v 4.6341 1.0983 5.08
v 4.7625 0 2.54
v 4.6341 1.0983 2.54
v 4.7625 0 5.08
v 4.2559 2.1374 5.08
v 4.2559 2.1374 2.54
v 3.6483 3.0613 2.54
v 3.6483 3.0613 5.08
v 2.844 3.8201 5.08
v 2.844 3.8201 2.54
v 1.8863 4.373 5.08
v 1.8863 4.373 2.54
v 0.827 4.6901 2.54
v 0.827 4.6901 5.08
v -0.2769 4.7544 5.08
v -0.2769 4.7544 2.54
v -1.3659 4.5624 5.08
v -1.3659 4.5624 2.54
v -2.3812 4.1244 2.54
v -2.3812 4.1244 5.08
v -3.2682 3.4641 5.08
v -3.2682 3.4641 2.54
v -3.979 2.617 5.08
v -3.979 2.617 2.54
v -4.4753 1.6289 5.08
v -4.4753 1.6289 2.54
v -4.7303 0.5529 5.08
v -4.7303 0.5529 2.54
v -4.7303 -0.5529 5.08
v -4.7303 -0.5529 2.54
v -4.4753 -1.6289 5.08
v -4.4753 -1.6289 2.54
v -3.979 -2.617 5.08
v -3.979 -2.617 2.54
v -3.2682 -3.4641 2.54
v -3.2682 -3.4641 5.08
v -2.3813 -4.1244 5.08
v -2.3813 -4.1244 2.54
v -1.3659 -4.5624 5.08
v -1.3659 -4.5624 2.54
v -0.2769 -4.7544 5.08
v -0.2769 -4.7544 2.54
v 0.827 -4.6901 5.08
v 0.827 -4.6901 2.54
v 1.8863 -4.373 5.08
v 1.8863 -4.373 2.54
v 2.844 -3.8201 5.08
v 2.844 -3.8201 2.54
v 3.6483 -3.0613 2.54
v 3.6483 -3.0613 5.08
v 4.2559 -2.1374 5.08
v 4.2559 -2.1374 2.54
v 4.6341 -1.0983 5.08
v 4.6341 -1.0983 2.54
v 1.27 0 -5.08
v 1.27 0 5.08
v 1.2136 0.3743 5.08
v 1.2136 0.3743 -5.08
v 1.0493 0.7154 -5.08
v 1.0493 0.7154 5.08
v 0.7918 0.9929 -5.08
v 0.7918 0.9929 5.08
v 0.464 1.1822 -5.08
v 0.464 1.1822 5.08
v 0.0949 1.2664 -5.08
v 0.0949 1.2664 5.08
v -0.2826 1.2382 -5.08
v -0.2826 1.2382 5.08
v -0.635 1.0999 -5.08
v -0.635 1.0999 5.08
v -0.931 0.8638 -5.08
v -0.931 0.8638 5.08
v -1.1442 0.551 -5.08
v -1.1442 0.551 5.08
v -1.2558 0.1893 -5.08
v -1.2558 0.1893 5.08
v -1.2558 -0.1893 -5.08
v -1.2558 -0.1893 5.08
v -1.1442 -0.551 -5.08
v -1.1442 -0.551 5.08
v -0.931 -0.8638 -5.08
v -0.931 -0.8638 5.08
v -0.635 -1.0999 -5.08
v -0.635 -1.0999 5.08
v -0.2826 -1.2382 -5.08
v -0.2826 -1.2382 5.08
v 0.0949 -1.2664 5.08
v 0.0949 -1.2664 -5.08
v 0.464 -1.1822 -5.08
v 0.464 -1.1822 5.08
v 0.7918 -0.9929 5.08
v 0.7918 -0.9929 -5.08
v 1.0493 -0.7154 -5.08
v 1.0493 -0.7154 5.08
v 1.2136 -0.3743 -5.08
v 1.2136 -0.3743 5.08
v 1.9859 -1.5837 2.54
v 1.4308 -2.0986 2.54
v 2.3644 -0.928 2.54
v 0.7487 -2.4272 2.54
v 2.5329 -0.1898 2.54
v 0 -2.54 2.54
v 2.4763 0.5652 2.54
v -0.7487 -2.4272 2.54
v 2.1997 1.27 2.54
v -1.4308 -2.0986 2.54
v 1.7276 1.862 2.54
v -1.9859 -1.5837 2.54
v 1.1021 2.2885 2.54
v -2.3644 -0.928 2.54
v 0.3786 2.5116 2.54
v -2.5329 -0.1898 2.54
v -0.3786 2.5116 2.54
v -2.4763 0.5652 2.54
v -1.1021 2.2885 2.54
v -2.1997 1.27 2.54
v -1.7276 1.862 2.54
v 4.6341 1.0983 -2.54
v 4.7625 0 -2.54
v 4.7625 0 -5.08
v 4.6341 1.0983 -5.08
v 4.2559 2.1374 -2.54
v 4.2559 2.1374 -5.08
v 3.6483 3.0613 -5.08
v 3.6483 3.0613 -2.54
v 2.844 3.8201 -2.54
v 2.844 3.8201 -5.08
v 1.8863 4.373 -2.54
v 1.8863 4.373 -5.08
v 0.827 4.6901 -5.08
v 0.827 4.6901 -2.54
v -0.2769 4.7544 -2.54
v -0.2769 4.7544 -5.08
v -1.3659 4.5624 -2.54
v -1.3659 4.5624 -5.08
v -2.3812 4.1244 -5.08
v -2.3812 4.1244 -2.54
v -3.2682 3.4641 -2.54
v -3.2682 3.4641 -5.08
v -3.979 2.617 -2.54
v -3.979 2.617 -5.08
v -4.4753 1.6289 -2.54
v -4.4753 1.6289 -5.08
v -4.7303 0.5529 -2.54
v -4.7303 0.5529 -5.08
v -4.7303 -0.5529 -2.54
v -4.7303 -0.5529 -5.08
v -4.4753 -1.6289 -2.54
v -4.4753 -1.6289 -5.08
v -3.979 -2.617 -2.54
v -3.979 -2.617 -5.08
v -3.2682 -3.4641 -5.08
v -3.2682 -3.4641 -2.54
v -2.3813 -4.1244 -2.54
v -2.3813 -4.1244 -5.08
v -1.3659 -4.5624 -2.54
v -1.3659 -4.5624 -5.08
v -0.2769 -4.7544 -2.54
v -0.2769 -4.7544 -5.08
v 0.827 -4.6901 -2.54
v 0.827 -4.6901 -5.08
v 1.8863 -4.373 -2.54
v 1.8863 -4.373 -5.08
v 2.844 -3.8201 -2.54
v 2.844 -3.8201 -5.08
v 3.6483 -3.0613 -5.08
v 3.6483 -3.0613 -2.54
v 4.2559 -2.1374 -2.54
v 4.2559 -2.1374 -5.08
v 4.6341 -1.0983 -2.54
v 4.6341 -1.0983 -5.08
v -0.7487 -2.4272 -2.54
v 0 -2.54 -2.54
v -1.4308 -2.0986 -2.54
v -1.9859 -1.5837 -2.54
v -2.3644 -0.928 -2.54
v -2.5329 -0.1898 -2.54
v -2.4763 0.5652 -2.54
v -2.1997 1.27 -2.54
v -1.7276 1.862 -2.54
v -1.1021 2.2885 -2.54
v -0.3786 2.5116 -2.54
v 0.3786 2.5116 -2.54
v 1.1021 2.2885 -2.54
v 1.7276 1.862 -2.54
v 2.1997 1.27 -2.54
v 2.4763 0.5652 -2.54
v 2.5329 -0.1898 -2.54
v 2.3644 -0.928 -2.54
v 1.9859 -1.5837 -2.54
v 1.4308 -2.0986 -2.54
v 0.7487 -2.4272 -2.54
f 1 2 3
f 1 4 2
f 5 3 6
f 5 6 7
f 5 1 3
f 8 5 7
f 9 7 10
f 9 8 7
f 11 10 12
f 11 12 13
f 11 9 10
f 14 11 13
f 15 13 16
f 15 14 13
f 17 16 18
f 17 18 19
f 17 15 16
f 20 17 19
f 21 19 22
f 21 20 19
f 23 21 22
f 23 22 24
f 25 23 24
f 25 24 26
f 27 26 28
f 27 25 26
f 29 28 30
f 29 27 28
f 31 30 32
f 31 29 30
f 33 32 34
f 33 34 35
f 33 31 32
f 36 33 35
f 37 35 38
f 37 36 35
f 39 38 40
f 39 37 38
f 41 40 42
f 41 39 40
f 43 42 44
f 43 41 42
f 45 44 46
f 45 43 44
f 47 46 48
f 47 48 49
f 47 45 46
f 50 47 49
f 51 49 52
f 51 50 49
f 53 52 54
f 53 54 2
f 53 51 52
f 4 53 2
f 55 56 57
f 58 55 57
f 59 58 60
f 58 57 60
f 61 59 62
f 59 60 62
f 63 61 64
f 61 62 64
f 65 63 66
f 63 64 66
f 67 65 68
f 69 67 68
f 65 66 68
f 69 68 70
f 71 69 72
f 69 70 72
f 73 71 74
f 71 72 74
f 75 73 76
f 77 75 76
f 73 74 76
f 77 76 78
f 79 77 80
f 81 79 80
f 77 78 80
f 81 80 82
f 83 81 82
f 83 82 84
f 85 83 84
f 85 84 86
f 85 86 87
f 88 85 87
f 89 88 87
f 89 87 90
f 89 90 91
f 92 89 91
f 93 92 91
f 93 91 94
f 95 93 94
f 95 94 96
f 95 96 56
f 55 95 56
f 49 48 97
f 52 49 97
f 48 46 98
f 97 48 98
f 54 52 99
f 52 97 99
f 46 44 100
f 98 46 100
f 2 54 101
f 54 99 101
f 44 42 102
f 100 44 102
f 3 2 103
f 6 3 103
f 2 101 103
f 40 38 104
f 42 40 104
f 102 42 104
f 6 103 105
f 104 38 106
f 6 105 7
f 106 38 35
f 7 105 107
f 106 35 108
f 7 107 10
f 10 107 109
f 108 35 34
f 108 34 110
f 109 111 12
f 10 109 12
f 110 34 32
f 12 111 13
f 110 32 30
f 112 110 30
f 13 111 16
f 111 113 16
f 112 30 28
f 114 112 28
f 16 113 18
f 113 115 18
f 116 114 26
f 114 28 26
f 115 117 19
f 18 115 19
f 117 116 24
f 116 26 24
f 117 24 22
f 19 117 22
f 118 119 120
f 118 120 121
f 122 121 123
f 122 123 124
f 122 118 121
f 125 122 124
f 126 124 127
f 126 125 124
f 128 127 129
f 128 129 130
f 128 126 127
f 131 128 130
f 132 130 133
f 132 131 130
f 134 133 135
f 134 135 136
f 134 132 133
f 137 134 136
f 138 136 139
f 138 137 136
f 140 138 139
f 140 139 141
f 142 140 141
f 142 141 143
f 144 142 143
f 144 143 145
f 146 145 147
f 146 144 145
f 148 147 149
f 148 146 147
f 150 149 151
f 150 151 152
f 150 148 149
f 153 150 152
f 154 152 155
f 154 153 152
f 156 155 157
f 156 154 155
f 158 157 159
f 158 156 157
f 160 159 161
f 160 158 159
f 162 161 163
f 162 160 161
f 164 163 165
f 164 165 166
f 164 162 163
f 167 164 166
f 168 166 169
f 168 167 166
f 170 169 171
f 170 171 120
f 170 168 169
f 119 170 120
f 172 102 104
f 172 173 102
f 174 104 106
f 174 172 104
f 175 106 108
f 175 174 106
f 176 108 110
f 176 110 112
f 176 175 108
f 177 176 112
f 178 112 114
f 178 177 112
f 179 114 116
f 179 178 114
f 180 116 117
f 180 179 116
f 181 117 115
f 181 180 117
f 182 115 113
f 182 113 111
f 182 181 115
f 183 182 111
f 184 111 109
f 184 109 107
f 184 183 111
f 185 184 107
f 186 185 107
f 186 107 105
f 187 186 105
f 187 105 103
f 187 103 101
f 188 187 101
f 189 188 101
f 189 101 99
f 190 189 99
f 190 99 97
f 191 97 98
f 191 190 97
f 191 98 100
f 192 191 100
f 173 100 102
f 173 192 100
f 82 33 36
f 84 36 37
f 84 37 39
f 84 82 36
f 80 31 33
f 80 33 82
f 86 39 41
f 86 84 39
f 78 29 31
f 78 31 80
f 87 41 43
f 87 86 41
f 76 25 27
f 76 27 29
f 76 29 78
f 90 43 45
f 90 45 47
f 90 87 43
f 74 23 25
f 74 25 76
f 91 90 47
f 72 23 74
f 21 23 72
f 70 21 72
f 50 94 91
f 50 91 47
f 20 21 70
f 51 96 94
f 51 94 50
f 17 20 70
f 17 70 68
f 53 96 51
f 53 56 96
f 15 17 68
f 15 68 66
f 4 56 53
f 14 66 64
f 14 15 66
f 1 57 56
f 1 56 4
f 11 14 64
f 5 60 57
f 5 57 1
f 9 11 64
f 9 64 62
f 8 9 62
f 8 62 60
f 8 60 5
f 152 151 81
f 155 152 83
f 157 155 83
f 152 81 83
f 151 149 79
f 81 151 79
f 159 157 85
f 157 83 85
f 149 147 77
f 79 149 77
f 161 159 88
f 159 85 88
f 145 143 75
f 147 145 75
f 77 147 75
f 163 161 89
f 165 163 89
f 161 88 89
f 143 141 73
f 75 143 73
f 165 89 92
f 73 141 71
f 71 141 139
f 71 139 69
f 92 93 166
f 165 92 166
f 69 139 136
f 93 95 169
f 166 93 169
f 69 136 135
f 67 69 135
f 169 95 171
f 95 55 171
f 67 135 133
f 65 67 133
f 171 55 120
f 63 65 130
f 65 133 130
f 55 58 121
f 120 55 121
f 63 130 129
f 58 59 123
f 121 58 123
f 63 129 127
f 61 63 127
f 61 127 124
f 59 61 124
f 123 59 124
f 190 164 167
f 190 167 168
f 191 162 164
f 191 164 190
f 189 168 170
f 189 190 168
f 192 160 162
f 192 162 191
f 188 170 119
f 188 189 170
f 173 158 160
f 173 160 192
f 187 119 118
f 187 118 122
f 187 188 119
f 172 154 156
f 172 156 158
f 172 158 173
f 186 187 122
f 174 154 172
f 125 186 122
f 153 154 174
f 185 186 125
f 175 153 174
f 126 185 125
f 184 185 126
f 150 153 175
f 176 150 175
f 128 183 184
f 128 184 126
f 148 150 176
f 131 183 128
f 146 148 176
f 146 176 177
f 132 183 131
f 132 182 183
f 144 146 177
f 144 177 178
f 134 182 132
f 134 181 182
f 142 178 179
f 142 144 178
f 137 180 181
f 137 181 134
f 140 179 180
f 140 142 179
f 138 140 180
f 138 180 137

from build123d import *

# Parameters (mm, degrees)
SKETCH1_R               = 4.7625
BOSS_EXTRUDE1_DEPTH     = 5.08
SKETCH2_W               = 5.08
SKETCH2_H               = 4.445
SKETCH3_R               = 1.27
CUT_EXTRUDE1_DEPTH      = 1
CUT_EXTRUDE1_DEPTH_BACK = 11.16


with BuildPart() as part:
    # Sketch1 → Boss-Extrude1 (new body, symmetric)
    with BuildSketch(Plane.XY):
        Circle(SKETCH1_R)
    extrude(amount=BOSS_EXTRUDE1_DEPTH, both=True)

    # Sketch2 → Cut-Revolve1 (revolve, cut)
    with BuildSketch(Plane(origin=(0, 0, 0), x_dir=(0, 0, -1), z_dir=(1, 0, 0)), mode=Mode.PRIVATE) as cut_revolve1_sk:
        with Locations((0, 4.7625)):
            Rectangle(SKETCH2_W, SKETCH2_H)
    revolve(cut_revolve1_sk.sketch.rotate(Axis((0, 0, 0), (0, 0, -1)), 180), axis=Axis((0, 0, 0), (0, 0, -1)), mode=Mode.SUBTRACT)  # turned: the seam where the file's is

    # Sketch3 → Cut-Extrude1 (cut, two sides)
    with BuildSketch(Plane.XY.offset(5.08)) as cut_extrude1_sk:
        Circle(SKETCH3_R)
    extrude(amount=CUT_EXTRUDE1_DEPTH, mode=Mode.SUBTRACT)
    extrude(cut_extrude1_sk.sketch, amount=-CUT_EXTRUDE1_DEPTH_BACK, mode=Mode.SUBTRACT)


solid = part.part
